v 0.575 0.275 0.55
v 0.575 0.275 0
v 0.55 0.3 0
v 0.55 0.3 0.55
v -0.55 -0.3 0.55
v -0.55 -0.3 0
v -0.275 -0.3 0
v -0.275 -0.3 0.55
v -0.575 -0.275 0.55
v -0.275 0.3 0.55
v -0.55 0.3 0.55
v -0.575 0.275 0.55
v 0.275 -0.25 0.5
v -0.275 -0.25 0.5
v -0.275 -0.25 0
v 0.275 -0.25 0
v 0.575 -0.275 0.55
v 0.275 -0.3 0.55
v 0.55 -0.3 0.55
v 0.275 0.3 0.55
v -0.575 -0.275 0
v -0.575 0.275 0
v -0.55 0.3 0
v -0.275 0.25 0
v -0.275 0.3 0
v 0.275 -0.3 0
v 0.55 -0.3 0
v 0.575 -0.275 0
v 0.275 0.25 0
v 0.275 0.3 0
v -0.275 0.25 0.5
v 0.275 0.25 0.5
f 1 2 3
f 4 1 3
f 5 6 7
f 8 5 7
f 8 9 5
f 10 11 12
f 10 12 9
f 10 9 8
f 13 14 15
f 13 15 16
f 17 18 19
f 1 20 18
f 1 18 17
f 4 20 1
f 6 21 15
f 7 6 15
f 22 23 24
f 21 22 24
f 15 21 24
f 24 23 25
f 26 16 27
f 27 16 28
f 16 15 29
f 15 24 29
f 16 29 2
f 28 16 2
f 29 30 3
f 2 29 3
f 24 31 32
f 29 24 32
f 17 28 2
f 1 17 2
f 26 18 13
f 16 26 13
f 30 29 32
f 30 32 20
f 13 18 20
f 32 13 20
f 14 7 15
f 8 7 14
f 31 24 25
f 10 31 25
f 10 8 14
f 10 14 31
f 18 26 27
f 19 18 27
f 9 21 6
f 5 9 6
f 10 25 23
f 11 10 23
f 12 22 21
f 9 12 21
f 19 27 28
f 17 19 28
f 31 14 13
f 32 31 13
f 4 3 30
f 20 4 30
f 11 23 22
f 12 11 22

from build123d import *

# Parameters (mm, degrees)
EXTRUDE1_DEPTH     = 0.55
SKETCH1_W          = 0.55
SKETCH1_H          = 0.05
CUT_EXTRUDE1_DEPTH = 10
SKETCH2_W          = 0.55
SKETCH2_H          = 0.05
CUT_EXTRUDE2_DEPTH = 10


with BuildPart() as part:
    # COMPONENT_OUTLINE → Extrude1 (new body)
    with BuildSketch(Plane.XY):
        Polygon((0.55, 0.3), (-0.55, 0.3), (-0.575, 0.275), (-0.575, -0.275), (-0.55, -0.3), (0.55, -0.3), (0.575, -0.275), (0.575, 0.275), align=None)
    extrude(amount=EXTRUDE1_DEPTH)

    # Sketch1 → Cut-Extrude1 (cut)
    with BuildSketch(Plane.XY.offset(0.55)):
        with Locations((0, -0.275)):
            Rectangle(SKETCH1_W, SKETCH1_H)
        with Locations((0, 0.275)):
            Rectangle(SKETCH1_W, SKETCH1_H)
    extrude(amount=-CUT_EXTRUDE1_DEPTH, mode=Mode.SUBTRACT)

    # Sketch2 → Cut-Extrude2 (cut)
    with BuildSketch(Plane.XZ.offset(0.25)):
        with Locations((0, 0.525)):
            Rectangle(SKETCH2_W, SKETCH2_H)
    extrude(amount=-CUT_EXTRUDE2_DEPTH, mode=Mode.SUBTRACT)


solid = part.part
